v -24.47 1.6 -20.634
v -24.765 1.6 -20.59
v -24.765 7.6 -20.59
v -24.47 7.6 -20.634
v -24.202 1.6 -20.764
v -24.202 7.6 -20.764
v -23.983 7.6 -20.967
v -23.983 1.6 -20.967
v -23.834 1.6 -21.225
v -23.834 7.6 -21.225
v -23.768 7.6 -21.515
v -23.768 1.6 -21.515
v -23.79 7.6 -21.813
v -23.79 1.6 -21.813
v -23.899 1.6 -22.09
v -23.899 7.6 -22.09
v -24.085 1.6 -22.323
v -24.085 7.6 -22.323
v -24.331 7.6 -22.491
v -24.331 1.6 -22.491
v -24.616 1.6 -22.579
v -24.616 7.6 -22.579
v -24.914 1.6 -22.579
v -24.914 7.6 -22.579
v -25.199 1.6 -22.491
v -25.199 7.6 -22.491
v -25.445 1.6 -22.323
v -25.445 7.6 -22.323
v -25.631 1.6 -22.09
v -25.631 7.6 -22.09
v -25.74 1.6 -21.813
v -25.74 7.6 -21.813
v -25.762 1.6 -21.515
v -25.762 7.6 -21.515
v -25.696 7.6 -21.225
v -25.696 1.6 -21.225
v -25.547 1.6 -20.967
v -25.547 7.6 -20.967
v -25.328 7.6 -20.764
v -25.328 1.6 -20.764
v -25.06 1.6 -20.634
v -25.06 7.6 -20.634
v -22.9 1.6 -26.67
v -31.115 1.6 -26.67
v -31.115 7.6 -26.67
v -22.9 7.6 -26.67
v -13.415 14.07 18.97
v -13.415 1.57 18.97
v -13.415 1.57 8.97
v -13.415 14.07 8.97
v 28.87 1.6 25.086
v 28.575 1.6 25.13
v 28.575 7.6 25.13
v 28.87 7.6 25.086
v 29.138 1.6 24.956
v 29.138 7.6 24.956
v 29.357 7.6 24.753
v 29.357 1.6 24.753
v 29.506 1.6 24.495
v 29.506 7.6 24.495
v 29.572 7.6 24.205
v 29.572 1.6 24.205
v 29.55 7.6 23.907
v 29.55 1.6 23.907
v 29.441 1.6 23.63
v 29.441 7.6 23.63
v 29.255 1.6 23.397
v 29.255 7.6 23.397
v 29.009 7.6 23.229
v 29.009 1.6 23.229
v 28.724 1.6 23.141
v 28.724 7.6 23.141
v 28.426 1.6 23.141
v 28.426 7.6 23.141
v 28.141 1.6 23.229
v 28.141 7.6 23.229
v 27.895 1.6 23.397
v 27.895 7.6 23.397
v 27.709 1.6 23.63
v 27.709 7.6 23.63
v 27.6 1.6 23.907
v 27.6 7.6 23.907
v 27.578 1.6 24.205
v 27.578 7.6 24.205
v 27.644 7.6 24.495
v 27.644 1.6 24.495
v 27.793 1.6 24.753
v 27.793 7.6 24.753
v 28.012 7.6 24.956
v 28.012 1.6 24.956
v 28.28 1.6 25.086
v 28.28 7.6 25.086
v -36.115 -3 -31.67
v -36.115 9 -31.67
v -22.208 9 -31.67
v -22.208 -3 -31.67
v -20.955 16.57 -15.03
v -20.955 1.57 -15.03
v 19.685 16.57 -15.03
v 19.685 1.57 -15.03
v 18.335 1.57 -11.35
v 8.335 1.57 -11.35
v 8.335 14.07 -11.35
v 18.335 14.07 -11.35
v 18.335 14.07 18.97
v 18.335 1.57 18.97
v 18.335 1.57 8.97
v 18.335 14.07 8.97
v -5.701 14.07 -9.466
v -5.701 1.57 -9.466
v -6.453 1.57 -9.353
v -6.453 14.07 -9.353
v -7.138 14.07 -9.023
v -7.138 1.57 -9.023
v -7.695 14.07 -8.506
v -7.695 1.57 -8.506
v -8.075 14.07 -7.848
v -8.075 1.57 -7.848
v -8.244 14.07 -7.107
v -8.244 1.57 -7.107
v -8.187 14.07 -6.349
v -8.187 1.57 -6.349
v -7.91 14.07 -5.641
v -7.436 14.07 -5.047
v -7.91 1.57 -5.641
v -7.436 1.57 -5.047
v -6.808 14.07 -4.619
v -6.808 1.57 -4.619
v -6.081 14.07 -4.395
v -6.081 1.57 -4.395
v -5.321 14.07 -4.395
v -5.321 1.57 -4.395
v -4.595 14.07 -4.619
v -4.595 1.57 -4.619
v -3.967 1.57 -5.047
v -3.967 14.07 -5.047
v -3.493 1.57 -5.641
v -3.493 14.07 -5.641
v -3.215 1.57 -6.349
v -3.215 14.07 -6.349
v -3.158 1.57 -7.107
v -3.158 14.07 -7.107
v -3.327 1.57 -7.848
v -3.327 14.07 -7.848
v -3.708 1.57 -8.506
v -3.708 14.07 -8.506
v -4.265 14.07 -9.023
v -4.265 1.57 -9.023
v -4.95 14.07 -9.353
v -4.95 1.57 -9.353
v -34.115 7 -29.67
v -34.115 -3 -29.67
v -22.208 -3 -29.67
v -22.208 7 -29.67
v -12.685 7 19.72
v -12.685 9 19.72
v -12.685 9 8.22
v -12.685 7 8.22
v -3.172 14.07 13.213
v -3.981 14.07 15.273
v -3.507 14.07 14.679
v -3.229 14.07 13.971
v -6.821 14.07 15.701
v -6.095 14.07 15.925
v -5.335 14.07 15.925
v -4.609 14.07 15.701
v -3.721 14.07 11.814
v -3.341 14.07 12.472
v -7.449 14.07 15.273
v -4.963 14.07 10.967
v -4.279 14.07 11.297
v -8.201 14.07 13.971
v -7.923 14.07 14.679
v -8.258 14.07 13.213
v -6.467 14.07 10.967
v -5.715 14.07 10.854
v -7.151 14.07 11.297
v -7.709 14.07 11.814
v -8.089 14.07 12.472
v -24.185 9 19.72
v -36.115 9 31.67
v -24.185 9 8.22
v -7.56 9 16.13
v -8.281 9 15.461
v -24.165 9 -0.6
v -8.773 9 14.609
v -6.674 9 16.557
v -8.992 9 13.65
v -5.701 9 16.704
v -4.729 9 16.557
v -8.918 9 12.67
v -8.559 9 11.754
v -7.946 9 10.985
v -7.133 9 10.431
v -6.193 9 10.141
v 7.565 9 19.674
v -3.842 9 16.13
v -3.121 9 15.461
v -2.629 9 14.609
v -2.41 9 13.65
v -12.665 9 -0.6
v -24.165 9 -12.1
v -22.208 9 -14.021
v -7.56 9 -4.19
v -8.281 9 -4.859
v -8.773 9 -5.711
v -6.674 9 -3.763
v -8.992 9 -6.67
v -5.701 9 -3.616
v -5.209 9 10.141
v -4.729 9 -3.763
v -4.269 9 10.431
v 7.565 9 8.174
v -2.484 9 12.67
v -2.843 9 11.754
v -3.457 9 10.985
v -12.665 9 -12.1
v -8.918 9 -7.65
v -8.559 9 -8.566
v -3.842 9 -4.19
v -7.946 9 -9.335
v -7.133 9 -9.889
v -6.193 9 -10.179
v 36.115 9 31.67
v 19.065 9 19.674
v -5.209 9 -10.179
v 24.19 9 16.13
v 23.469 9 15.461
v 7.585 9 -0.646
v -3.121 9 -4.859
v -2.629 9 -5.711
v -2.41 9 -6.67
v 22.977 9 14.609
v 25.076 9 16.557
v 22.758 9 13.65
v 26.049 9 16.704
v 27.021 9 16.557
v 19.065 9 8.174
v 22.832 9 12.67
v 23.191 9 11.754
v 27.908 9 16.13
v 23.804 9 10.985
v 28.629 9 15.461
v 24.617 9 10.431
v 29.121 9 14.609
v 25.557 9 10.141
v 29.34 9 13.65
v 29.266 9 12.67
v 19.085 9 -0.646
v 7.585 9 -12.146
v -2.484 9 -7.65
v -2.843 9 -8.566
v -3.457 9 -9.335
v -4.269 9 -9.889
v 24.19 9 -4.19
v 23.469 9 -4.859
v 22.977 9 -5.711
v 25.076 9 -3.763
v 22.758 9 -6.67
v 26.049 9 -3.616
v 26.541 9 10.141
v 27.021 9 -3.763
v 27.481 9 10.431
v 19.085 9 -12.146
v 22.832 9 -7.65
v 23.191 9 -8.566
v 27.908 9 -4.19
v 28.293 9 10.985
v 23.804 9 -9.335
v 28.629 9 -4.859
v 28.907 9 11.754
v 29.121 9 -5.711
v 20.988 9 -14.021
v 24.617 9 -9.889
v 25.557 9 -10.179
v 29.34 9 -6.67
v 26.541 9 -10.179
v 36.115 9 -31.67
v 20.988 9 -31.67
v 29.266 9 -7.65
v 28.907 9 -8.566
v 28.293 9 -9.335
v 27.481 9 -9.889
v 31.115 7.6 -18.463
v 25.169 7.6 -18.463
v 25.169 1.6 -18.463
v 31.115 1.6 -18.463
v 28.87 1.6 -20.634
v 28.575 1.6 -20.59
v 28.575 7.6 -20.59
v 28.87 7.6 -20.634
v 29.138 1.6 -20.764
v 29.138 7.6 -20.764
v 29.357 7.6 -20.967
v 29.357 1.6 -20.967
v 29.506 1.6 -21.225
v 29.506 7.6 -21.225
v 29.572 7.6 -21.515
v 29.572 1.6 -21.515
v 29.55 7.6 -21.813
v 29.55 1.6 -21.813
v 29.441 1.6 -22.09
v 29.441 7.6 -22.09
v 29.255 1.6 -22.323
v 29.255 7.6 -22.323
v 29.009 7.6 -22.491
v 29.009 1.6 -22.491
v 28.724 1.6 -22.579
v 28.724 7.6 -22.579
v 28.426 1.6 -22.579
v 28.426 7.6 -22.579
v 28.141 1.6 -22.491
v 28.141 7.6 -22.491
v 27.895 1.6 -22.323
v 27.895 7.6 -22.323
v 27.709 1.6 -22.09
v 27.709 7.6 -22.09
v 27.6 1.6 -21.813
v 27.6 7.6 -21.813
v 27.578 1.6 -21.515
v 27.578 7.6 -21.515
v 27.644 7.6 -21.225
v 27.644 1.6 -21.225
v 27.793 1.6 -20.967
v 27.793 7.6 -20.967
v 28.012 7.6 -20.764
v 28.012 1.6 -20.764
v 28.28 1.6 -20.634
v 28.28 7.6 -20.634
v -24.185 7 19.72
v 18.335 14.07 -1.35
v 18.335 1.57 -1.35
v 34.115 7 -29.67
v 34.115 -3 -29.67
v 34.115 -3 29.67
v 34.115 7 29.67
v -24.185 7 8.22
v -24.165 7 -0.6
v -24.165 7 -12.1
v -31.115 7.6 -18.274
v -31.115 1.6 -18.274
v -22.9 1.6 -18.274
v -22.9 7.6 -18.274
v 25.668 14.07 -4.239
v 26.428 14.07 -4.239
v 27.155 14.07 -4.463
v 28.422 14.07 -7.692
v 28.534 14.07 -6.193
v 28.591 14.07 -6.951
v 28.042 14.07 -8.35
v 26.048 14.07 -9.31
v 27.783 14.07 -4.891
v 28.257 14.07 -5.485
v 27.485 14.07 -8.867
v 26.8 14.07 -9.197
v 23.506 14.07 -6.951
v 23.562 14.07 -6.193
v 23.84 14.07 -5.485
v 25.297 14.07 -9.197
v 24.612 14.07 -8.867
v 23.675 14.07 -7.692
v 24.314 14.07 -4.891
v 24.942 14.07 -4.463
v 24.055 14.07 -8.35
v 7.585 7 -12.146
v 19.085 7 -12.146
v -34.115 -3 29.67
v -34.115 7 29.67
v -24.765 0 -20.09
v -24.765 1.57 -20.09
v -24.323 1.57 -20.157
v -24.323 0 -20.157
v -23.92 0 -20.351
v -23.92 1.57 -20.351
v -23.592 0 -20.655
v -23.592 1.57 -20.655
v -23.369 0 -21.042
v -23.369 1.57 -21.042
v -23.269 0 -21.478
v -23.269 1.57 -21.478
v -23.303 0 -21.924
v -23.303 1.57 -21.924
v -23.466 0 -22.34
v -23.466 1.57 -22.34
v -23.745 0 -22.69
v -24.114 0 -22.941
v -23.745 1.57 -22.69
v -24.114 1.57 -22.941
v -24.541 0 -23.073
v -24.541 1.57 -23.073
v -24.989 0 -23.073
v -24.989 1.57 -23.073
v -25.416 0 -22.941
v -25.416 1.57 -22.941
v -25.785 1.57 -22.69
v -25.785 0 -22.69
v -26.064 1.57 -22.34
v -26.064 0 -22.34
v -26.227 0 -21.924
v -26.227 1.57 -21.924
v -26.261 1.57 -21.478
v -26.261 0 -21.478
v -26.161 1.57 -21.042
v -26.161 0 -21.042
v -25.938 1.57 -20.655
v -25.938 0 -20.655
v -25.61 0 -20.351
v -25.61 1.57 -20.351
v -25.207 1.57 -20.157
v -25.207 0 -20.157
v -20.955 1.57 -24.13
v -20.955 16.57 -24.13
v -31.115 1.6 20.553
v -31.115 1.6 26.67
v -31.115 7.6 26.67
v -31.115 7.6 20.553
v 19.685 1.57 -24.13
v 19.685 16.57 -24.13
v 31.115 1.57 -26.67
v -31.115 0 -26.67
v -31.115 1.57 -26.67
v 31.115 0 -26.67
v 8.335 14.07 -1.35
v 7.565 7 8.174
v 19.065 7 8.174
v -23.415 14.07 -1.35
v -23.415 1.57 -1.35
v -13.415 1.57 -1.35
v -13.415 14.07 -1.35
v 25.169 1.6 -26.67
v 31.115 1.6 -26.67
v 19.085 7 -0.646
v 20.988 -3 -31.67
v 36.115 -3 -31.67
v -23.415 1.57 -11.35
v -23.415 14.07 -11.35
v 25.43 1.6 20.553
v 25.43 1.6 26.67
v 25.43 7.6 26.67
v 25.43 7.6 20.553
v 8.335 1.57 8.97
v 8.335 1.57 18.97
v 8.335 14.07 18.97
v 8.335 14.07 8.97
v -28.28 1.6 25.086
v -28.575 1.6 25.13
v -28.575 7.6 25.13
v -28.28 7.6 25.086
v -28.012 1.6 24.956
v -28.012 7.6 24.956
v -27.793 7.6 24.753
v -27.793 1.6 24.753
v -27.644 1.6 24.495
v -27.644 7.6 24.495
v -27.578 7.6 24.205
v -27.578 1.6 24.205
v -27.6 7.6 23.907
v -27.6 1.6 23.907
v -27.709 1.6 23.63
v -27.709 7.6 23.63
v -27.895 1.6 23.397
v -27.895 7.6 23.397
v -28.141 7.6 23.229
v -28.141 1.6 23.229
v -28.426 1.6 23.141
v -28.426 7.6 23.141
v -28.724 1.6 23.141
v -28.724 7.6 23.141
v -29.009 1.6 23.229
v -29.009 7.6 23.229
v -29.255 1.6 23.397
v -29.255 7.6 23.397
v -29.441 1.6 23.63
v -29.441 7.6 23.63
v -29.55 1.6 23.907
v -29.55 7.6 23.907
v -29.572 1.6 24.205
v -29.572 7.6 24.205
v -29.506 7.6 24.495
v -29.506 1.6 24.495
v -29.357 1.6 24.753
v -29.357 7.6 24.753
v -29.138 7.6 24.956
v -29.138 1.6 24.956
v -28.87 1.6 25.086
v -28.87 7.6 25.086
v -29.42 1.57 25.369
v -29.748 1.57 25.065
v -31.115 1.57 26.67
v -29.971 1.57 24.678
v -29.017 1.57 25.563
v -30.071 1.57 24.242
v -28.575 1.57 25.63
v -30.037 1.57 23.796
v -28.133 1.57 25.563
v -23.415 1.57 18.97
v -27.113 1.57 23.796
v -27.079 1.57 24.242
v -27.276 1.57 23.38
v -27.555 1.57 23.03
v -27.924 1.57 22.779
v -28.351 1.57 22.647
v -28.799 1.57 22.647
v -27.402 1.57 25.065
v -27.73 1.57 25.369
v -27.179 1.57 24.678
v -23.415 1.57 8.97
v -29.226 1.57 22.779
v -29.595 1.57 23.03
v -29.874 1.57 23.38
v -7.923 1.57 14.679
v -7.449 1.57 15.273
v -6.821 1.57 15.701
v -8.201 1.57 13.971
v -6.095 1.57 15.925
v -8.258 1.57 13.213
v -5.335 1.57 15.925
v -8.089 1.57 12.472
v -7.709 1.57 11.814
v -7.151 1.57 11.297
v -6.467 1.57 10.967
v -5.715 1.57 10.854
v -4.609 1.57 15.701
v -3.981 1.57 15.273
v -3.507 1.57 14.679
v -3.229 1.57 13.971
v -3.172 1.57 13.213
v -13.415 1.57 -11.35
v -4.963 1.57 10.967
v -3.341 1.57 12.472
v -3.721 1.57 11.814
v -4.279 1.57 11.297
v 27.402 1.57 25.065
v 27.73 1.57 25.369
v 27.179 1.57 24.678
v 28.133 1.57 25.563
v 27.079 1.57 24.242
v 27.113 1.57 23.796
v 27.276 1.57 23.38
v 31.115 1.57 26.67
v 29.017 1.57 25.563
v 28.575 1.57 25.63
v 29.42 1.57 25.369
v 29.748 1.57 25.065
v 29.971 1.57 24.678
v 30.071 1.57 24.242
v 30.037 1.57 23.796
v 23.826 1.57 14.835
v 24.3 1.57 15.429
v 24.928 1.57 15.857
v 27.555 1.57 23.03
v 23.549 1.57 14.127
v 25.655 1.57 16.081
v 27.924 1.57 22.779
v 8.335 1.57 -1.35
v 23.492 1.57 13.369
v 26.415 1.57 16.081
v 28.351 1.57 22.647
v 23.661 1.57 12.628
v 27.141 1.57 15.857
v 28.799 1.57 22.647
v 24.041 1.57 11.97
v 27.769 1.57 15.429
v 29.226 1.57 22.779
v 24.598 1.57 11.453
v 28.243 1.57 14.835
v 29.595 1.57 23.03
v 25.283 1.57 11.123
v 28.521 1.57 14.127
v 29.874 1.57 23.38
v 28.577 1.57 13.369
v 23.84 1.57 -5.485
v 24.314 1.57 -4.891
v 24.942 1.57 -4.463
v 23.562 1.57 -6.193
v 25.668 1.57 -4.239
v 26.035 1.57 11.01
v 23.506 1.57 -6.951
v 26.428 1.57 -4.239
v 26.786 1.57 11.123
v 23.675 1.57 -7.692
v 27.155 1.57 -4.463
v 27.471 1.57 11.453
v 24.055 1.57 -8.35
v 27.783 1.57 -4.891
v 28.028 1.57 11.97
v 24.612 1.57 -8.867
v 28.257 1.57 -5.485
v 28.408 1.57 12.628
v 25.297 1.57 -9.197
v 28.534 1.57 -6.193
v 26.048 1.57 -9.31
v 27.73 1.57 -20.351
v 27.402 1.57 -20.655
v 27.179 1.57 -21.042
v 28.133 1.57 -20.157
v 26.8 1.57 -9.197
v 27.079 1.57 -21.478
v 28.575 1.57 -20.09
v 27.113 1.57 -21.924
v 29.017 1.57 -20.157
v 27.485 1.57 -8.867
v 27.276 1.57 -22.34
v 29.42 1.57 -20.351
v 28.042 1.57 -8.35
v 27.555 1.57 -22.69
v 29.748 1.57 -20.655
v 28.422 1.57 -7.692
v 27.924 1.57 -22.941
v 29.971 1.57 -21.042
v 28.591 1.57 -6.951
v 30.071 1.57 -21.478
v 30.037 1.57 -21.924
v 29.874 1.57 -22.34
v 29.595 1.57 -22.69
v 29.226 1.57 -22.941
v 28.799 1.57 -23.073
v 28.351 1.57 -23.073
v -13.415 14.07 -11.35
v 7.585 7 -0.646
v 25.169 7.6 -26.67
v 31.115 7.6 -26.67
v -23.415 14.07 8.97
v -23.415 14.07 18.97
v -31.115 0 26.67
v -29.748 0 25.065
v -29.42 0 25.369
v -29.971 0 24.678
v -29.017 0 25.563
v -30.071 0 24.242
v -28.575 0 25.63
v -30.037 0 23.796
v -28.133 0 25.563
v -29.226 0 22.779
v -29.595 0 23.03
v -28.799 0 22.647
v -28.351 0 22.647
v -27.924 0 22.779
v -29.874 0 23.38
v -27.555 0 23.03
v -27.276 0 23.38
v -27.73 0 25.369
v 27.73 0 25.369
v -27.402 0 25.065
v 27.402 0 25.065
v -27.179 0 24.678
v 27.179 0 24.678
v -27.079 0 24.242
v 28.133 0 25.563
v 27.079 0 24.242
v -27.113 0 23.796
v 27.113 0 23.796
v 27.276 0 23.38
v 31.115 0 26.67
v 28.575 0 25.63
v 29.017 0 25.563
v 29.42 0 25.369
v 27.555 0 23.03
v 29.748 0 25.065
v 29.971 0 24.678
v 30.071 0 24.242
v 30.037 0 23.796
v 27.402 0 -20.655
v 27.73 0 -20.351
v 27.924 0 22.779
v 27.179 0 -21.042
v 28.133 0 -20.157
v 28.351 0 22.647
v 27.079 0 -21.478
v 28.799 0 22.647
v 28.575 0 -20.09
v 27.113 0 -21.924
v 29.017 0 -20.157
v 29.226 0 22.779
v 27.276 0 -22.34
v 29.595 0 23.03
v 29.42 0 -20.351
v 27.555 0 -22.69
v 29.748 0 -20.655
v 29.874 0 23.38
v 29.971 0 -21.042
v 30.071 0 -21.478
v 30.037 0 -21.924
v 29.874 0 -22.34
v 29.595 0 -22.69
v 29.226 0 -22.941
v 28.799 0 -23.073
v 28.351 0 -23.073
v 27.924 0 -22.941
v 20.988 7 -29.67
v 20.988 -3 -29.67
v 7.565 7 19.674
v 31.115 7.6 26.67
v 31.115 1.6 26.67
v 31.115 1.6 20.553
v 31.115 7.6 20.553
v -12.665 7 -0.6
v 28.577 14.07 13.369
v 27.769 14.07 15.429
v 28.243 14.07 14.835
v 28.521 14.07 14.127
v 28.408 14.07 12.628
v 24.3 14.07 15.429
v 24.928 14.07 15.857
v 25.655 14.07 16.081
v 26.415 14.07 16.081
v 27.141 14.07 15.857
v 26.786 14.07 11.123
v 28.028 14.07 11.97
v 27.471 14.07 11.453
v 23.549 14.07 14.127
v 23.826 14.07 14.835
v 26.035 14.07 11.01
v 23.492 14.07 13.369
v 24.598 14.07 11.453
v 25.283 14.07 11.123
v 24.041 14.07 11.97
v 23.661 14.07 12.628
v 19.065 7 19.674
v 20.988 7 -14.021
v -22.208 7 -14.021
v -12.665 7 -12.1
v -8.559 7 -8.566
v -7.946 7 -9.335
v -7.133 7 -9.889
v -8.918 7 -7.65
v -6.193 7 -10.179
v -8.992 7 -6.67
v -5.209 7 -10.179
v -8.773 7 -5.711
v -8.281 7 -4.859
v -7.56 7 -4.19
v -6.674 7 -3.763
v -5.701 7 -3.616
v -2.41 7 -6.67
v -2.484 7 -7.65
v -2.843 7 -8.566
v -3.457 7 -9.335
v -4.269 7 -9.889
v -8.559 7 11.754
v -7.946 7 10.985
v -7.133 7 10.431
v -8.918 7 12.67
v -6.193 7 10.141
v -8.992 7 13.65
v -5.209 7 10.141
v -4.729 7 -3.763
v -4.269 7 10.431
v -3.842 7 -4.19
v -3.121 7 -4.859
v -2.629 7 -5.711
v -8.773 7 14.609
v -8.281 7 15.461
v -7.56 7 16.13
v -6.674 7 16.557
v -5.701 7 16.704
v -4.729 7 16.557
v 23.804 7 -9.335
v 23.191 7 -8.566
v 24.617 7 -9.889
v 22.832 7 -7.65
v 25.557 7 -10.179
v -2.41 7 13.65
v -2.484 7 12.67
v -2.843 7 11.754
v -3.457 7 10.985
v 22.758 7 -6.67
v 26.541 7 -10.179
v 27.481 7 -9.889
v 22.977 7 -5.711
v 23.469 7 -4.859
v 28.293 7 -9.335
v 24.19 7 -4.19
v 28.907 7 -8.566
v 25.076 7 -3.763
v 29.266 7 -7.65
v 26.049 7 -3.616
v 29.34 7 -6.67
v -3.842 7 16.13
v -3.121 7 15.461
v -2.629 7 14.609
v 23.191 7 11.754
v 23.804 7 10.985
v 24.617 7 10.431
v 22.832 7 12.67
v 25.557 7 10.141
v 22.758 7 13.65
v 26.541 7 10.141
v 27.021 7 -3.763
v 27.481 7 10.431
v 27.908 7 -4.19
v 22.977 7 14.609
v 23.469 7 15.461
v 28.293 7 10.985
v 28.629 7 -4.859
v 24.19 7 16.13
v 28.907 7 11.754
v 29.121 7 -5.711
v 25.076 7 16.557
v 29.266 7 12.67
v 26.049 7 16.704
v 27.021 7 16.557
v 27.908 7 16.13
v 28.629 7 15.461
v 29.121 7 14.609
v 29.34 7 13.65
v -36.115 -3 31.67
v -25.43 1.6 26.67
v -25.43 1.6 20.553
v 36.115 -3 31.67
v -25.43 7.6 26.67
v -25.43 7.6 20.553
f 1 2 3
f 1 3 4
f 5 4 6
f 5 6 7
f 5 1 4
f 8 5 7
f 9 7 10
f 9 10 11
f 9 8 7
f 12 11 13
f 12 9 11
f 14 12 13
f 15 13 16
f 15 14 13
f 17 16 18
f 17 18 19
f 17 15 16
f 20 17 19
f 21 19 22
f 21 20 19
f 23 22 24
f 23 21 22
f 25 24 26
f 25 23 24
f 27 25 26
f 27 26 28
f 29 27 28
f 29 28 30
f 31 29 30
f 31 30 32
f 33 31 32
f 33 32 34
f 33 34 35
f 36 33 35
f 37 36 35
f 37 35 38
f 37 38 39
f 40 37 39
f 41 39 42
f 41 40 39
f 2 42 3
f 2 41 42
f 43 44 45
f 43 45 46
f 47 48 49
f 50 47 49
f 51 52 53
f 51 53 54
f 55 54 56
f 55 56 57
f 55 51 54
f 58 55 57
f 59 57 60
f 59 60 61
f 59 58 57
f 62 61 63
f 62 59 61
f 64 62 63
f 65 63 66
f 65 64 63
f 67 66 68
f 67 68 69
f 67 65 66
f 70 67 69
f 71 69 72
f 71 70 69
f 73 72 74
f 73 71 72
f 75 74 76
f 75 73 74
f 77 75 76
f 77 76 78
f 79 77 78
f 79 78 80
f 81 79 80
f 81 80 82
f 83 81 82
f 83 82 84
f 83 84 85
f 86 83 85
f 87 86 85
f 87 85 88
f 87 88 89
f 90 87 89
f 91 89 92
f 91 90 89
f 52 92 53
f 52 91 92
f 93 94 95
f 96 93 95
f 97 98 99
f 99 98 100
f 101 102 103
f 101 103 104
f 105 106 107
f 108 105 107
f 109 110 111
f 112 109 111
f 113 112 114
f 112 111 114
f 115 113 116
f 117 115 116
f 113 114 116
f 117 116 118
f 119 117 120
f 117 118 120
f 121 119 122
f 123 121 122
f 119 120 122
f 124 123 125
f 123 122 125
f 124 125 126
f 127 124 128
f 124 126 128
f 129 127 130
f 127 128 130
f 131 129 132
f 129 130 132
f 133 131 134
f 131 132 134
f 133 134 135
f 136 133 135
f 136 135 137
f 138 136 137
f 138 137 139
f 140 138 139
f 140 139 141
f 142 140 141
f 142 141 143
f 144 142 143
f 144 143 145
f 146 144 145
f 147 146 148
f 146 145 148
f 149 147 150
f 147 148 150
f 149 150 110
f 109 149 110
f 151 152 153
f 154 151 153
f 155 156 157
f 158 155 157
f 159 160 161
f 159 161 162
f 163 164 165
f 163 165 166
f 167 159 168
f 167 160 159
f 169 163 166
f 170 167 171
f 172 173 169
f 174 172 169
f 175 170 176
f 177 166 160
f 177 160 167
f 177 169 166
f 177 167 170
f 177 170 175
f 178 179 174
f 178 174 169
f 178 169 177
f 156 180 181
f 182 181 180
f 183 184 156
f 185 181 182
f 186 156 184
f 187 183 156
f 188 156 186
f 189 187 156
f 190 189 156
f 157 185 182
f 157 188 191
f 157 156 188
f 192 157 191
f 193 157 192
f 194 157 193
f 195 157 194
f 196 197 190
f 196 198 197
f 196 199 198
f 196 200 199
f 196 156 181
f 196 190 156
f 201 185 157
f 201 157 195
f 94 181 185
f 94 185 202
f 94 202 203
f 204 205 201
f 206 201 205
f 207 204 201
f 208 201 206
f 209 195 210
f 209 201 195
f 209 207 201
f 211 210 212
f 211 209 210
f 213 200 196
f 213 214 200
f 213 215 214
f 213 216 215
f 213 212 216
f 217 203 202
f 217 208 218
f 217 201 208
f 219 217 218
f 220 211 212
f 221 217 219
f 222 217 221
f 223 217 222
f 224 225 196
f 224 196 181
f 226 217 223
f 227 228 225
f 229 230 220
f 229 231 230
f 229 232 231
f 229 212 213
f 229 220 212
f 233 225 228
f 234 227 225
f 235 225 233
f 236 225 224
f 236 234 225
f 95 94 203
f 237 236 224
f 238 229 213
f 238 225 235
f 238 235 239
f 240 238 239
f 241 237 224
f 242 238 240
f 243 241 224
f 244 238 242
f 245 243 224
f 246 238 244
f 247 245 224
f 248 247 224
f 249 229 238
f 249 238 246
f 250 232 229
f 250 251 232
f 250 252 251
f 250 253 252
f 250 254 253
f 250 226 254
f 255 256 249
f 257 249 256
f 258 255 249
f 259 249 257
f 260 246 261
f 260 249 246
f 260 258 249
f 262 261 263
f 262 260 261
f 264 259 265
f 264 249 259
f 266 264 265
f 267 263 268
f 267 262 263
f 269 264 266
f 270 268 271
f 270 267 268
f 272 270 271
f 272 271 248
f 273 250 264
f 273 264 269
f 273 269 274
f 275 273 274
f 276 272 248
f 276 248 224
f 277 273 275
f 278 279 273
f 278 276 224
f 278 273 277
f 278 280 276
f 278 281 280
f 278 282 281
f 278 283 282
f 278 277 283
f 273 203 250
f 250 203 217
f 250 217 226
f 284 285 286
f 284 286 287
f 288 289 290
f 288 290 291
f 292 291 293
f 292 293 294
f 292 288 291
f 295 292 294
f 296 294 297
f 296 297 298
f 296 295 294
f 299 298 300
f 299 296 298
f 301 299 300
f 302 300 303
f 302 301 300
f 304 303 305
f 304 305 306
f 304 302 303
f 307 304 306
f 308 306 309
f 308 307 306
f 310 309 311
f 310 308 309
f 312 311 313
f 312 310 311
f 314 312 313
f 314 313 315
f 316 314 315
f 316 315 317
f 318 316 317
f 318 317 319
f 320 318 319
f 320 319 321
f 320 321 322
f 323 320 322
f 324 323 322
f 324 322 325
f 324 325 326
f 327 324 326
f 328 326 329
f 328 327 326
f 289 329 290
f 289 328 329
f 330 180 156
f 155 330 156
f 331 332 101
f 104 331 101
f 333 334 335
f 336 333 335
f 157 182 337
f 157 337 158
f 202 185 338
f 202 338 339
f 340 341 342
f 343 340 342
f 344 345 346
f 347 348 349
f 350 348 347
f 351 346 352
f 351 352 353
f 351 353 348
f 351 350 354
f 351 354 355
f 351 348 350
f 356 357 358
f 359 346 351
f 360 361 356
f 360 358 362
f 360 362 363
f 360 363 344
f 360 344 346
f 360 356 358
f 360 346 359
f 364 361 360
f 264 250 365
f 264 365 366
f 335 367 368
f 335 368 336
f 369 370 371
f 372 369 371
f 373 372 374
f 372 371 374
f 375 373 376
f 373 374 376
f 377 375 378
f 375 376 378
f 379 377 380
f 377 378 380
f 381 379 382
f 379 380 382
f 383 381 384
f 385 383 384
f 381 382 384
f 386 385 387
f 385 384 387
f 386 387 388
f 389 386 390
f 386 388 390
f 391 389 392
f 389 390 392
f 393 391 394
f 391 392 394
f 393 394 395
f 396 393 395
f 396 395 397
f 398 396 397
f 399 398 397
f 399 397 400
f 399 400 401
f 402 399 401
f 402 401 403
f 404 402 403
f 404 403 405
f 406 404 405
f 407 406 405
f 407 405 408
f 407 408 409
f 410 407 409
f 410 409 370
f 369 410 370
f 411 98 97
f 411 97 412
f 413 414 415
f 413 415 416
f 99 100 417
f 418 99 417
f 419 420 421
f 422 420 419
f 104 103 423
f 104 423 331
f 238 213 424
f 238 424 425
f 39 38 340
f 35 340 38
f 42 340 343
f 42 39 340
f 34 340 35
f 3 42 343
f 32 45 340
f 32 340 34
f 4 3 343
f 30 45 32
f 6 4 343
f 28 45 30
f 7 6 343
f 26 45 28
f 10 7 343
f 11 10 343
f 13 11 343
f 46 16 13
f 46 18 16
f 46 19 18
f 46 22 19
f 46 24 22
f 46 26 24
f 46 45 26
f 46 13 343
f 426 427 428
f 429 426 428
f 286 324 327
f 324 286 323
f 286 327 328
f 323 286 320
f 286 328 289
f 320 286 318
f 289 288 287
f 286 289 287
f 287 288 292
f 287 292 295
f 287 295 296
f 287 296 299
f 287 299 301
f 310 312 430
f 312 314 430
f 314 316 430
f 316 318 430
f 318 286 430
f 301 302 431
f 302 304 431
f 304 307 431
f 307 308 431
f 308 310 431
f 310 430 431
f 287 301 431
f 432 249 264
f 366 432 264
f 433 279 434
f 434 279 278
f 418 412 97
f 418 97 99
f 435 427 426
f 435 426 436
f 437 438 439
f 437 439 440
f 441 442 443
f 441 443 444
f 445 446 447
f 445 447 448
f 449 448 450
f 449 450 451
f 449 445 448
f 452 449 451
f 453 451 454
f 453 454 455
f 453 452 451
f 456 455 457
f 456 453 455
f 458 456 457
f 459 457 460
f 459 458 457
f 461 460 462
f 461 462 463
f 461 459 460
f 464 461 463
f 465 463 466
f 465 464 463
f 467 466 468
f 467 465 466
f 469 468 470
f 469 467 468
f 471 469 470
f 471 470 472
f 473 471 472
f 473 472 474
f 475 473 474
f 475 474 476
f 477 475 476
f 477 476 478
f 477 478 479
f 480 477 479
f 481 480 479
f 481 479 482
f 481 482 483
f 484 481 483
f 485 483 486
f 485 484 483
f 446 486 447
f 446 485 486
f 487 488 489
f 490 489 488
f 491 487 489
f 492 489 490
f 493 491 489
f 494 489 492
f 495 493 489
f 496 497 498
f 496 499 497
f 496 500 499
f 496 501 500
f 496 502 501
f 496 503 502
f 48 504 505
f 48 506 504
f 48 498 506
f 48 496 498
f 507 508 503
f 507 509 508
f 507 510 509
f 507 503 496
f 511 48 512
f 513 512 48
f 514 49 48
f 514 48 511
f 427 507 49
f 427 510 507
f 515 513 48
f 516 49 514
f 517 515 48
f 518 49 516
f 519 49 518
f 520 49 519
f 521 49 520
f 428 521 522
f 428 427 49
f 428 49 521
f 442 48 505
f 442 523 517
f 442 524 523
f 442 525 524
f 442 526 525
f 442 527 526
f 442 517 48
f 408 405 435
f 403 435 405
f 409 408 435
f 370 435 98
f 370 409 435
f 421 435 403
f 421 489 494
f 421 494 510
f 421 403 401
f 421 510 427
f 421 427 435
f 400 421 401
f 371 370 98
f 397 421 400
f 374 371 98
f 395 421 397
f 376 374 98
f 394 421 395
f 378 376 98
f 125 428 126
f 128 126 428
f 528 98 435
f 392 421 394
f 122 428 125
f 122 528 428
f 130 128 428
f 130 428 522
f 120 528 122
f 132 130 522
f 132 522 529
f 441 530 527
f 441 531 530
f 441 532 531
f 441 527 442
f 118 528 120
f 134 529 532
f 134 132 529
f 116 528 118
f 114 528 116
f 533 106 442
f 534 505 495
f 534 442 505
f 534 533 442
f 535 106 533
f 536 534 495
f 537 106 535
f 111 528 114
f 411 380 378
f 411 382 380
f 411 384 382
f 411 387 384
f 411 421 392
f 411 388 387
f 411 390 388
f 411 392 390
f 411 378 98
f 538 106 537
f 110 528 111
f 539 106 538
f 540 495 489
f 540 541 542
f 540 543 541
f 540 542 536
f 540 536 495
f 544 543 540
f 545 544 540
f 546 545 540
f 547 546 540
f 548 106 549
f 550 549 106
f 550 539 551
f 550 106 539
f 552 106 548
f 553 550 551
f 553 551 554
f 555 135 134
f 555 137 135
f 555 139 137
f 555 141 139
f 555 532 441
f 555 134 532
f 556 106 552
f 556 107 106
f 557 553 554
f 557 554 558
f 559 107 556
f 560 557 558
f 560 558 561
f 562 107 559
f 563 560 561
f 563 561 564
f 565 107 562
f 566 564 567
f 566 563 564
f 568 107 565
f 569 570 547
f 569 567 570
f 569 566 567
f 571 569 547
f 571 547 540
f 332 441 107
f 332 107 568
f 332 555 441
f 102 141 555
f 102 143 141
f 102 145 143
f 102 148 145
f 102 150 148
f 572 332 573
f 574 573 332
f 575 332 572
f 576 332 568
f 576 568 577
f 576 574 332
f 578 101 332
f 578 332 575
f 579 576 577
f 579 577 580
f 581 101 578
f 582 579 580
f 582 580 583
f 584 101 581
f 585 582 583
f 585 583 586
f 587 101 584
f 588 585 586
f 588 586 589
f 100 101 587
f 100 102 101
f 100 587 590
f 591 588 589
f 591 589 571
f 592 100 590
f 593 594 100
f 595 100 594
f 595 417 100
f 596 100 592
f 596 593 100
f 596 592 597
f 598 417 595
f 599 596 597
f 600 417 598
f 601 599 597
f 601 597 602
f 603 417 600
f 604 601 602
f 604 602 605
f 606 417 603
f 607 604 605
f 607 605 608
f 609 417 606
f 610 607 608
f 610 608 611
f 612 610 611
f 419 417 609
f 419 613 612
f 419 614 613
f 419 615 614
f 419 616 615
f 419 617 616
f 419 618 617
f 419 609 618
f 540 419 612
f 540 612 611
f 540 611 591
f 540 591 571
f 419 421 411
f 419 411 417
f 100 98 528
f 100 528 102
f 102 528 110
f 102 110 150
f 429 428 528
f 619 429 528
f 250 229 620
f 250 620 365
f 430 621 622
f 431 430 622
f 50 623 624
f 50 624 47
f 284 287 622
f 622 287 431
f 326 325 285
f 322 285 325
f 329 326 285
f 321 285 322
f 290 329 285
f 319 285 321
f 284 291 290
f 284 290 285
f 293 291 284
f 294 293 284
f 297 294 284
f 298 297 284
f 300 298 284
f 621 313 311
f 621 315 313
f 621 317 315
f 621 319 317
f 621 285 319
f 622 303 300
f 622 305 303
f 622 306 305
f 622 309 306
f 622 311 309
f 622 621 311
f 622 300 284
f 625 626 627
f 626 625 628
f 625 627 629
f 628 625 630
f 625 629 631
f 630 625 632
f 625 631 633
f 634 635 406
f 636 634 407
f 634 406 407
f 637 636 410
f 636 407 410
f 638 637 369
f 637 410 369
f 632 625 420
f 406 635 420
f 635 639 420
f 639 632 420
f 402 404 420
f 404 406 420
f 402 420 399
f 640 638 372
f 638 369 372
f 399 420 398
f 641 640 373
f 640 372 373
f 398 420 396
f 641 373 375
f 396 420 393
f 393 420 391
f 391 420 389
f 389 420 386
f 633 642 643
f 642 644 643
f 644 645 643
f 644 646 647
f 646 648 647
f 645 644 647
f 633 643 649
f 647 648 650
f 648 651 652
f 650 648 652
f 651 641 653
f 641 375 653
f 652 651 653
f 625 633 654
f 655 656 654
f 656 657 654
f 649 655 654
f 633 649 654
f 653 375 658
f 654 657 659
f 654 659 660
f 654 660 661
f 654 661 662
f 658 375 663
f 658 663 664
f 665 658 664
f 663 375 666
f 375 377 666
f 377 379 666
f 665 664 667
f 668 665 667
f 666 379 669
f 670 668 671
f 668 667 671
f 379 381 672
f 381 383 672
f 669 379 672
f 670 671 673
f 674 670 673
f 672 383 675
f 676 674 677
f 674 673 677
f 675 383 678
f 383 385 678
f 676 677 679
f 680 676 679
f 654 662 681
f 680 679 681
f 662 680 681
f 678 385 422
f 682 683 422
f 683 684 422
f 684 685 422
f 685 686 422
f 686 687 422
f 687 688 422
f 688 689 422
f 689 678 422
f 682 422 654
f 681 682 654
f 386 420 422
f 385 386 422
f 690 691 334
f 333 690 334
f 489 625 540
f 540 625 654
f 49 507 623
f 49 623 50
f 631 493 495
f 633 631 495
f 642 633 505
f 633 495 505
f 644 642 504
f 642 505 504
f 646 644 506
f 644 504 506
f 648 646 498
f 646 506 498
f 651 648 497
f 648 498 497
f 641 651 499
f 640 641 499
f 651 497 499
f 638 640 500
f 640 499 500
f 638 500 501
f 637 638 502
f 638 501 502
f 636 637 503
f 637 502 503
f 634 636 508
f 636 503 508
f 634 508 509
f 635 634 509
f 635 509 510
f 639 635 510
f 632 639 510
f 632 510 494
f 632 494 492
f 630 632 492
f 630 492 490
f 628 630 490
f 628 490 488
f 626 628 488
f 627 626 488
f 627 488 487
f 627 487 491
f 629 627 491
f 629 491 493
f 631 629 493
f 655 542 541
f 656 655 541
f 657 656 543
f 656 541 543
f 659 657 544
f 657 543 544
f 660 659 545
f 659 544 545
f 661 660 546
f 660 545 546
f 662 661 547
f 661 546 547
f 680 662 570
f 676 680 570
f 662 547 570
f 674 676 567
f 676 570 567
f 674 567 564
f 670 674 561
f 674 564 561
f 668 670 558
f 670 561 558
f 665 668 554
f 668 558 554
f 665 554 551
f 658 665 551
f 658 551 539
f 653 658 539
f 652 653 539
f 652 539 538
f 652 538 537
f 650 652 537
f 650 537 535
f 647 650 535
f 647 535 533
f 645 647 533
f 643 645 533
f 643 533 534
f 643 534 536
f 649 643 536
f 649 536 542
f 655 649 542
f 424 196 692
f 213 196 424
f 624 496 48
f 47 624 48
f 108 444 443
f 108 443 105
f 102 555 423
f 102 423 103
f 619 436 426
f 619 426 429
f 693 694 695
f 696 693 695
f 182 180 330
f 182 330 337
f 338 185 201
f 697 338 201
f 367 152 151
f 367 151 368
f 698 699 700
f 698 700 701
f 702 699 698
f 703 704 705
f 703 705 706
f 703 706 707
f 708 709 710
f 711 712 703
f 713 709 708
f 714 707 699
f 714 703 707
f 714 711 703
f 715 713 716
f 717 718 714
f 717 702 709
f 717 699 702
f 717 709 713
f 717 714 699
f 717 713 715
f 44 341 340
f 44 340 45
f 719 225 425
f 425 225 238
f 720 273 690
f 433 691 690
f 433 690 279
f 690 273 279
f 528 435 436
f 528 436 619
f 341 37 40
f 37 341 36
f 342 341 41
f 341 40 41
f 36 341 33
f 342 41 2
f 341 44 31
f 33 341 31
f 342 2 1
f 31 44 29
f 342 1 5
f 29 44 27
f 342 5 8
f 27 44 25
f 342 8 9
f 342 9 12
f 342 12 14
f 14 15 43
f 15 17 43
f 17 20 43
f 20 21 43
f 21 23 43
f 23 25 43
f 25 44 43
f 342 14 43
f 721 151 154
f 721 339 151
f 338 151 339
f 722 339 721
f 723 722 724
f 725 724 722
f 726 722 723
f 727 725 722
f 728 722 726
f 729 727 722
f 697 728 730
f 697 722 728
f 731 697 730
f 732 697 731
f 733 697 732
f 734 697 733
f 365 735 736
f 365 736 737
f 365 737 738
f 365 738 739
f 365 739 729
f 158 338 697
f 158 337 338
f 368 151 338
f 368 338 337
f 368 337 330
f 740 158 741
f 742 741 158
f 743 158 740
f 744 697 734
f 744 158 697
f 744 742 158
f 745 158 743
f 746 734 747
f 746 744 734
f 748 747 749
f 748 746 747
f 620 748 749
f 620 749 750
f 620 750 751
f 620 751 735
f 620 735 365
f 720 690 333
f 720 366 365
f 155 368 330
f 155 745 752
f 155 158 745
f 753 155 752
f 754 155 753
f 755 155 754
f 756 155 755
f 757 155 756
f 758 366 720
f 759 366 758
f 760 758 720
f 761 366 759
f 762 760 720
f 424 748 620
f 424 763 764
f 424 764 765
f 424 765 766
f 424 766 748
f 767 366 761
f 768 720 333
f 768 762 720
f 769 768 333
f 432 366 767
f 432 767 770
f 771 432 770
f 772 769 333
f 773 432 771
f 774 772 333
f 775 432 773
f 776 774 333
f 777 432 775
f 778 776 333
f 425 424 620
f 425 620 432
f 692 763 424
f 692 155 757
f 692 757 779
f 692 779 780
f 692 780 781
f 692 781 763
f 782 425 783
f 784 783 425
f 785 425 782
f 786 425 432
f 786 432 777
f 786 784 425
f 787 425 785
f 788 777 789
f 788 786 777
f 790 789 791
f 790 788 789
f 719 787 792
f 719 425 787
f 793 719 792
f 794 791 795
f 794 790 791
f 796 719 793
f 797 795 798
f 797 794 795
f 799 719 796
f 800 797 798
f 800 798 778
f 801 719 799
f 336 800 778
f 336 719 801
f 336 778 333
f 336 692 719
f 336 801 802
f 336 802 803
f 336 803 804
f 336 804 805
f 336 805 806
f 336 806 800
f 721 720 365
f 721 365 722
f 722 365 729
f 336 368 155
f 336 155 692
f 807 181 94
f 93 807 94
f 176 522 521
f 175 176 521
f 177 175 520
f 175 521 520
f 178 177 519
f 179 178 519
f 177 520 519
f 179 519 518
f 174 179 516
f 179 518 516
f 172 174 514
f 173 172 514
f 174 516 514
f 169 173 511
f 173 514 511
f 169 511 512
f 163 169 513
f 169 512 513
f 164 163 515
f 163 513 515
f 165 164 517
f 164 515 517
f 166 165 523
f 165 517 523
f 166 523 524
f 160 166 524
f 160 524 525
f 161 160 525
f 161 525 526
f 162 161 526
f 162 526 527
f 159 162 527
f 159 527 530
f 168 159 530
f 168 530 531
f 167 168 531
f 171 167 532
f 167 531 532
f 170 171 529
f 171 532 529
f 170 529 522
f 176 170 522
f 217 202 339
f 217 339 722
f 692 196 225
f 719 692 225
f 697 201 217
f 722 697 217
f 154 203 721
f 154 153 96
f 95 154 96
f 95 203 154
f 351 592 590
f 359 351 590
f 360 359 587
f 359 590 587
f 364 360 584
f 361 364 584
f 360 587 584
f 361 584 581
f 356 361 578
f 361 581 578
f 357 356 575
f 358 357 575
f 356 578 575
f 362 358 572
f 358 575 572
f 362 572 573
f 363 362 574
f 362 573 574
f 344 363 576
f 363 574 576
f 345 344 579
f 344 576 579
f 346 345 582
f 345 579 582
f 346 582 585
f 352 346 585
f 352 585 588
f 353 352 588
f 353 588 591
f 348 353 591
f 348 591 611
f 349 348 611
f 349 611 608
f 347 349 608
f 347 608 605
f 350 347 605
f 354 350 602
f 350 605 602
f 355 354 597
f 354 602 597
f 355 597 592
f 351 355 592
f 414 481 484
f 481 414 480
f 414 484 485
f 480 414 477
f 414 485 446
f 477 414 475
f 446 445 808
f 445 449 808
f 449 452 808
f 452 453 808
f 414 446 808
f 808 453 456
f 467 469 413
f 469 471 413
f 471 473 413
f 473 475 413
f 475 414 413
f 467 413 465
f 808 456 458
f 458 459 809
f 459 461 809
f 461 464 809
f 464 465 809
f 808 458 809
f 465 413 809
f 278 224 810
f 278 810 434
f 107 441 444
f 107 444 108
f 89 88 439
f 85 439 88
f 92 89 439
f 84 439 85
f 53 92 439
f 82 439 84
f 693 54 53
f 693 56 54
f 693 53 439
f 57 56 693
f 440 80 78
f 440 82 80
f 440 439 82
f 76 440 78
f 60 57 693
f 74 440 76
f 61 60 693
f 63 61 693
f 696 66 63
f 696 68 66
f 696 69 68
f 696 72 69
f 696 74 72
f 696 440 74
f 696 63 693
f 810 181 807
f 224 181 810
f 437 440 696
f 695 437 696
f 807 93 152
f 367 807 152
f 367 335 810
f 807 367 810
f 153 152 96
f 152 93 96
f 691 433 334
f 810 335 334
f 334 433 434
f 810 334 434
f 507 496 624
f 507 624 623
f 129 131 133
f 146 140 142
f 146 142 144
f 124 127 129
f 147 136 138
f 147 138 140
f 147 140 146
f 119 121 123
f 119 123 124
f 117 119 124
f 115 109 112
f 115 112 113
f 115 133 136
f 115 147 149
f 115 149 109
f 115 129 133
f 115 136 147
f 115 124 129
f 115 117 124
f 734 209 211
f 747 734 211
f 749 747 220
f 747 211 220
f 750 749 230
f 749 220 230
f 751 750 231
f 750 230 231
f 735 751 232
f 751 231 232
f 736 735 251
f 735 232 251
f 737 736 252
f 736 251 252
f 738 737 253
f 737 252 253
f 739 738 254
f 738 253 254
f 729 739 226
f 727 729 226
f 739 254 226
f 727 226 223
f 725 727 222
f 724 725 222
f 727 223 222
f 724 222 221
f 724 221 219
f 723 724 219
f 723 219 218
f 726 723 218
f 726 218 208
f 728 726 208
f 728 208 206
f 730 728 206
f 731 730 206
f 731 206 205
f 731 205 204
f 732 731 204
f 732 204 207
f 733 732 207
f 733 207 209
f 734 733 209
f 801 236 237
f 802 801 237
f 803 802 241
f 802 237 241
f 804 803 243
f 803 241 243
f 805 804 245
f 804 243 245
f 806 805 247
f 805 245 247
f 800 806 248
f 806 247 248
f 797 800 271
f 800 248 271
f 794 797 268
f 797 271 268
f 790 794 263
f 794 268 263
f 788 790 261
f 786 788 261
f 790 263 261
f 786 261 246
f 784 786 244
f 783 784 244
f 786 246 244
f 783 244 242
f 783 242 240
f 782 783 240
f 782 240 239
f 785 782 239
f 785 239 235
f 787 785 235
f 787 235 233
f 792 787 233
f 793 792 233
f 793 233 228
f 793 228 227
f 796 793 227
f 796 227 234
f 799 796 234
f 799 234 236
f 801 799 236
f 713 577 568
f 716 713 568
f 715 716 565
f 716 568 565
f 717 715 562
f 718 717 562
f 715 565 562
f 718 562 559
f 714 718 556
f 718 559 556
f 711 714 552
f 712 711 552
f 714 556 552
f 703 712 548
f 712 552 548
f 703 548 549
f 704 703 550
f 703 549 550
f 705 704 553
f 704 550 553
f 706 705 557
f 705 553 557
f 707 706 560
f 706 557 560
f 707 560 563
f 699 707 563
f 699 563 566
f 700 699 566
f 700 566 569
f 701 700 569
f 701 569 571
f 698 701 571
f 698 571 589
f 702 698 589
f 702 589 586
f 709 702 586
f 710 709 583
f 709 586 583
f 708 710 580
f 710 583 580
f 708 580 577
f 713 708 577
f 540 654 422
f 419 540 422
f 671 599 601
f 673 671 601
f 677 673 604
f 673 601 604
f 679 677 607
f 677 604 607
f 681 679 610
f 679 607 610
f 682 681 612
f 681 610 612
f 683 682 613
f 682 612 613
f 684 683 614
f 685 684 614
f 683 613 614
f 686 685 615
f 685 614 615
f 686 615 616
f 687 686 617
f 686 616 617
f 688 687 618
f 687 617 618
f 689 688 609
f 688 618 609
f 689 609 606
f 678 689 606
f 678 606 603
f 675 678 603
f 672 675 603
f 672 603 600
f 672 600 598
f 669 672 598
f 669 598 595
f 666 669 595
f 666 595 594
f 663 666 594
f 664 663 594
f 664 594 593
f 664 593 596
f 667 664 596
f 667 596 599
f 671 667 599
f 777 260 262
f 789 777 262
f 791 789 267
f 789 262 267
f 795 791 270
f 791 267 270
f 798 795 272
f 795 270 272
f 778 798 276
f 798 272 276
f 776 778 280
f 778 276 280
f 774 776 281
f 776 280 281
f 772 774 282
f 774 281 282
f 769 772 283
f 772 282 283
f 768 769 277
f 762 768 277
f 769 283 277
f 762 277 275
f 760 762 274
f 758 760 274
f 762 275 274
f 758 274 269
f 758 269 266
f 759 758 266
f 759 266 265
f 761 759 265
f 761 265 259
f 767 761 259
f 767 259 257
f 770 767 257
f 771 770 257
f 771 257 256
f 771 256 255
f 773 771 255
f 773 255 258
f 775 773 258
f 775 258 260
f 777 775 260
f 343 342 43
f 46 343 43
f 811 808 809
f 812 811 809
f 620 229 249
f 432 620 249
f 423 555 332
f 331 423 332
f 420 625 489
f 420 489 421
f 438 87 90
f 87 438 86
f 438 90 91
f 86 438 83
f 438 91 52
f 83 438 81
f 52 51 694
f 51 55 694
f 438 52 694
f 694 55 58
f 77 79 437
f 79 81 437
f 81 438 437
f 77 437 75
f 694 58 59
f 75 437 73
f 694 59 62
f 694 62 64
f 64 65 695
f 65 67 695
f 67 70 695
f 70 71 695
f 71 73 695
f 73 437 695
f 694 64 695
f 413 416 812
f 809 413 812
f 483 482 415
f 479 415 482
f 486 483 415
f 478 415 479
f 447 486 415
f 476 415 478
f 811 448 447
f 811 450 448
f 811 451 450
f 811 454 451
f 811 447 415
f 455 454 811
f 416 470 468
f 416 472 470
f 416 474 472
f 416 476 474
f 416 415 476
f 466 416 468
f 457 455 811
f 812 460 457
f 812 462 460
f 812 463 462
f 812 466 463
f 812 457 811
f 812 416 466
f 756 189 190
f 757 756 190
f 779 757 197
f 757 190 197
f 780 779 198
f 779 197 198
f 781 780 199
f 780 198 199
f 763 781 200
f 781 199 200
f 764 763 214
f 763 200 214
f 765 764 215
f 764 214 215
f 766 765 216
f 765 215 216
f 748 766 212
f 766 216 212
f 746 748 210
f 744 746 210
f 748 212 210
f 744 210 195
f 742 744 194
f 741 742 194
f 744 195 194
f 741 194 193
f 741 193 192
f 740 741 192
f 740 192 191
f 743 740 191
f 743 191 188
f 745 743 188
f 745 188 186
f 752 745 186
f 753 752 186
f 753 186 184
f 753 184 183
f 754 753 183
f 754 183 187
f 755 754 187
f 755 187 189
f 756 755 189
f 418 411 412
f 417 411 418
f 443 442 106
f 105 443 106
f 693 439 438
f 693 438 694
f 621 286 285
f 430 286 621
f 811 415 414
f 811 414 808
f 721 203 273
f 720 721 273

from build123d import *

# Parameters (mm, degrees)
SKETCH1_W             = 62.23
SKETCH1_H             = 53.34
BOSS_EXTRUDE1_DEPTH   = 1.57
SKETCH2_W             = 10
SKETCH2_H             = 10
BOSS_EXTRUDE2_DEPTH   = 12.5
SKETCH3_R             = 2.55
BOSS_EXTRUDE3_DEPTH   = 12.5
SKETCH4_W             = 40.64
SKETCH4_H             = 9.1
BOSS_EXTRUDE4_DEPTH   = 15
SKETCH5_R             = 1.5
CUT_EXTRUDE1_DEPTH    = 44.639799782
SKETCH6_W             = 72.23
SKETCH6_H             = 63.34
BOSS_EXTRUDE5_DEPTH   = 12
SKETCH7_W             = 68.23
SKETCH7_H             = 59.34
CUT_EXTRUDE2_DEPTH    = 10
SKETCH8_R             = 3.3
SKETCH8_W             = 43.19595156
SKETCH8_H             = 17.648733465
SKETCH8_W_2           = 11.5
SKETCH8_H_2           = 11.5
CUT_EXTRUDE3_DEPTH    = 50.510424407
SKETCH9_W             = 8.2149345
SKETCH9_H             = 8.395539661
SKETCH9_R             = 1
BOSS_EXTRUDE6_DEPTH   = 6
SKETCH9_W_2           = 5.685125291
SKETCH9_H_2           = 6.117087564
BOSS_EXTRUDE6_2_DEPTH = 6
BOSS_EXTRUDE6_3_DEPTH = 6
SKETCH9_W_3           = 5.946391127
SKETCH9_H_3           = 8.207214253
BOSS_EXTRUDE6_4_DEPTH = 6


with BuildPart() as part:
    # Sketch1 → Boss-Extrude1 (new body)
    with BuildSketch(Plane(origin=(0, 0, 0), x_dir=(1, 0, 0), z_dir=(0, 1, 0))):
        Rectangle(SKETCH1_W, SKETCH1_H)
    extrude(amount=BOSS_EXTRUDE1_DEPTH)

    # Sketch2 → Boss-Extrude2 (add)
    with BuildSketch(Plane(origin=(0, 1.57, 0), x_dir=(1, 0, 0), z_dir=(0, 1, 0))):
        with Locations((-18.415, -13.97)):
            Rectangle(SKETCH2_W, SKETCH2_H)
        with Locations((13.335, -13.97)):
            Rectangle(SKETCH2_W, SKETCH2_H)
        with Locations((13.335, 6.35)):
            Rectangle(SKETCH2_W, SKETCH2_H)
        with Locations((-18.415, 6.35)):
            Rectangle(SKETCH2_W, SKETCH2_H)
    extrude(amount=BOSS_EXTRUDE2_DEPTH)

    # Sketch3 → Boss-Extrude3 (add)
    with BuildSketch(Plane(origin=(0, 1.57, 0), x_dir=(1, 0, 0), z_dir=(0, 1, 0))):
        with Locations(Location((-5.715, -13.403860223, 0), (0, 0, 90))):
            Circle(SKETCH3_R)
        with Locations(Location((26.034616992, -13.559811685, 0), (0, 0, 90))):
            Circle(SKETCH3_R)
        with Locations(Location((26.04840041, 6.760188315, 0), (0, 0, 90))):
            Circle(SKETCH3_R)
        with Locations(Location((-5.701216582, 6.916139777, 0), (0, 0, 90))):
            Circle(SKETCH3_R)
    extrude(amount=BOSS_EXTRUDE3_DEPTH)

    # Sketch4 → Boss-Extrude4 (add)
    with BuildSketch(Plane(origin=(0, 1.57, 0), x_dir=(1, 0, 0), z_dir=(0, 1, 0))):
        with Locations((-0.635, 19.58)):
            Rectangle(SKETCH4_W, SKETCH4_H)
    extrude(amount=BOSS_EXTRUDE4_DEPTH)

    # Sketch5 → Cut-Extrude1 (cut, through all)
    with BuildSketch(Plane(origin=(0, 1.57, 0), x_dir=(1, 0, 0), z_dir=(0, 1, 0))):
        with Locations(Location((-24.765, 21.59, 0), (0, 0, 270))):
            Circle(SKETCH5_R)
        with Locations(Location((-28.575, -24.13, 0), (0, 0, 270))):
            Circle(SKETCH5_R)
        with Locations(Location((28.575, -24.13, 0), (0, 0, 270))):
            Circle(SKETCH5_R)
        with Locations(Location((28.575, 21.59, 0), (0, 0, 270))):
            Circle(SKETCH5_R)
    extrude(amount=-CUT_EXTRUDE1_DEPTH, mode=Mode.SUBTRACT)


with BuildPart() as body_2:
    # Sketch6 → Boss-Extrude5 (new body)
    with BuildSketch(Plane(origin=(0, 9, 0), x_dir=(1, 0, 0), z_dir=(0, 1, 0))):
        Rectangle(SKETCH6_W, SKETCH6_H)
    extrude(amount=-BOSS_EXTRUDE5_DEPTH)

    # Sketch7 → Cut-Extrude2 (cut)
    with BuildSketch(Plane.XZ.offset(3)):
        Rectangle(SKETCH7_W, SKETCH7_H)
    extrude(amount=-CUT_EXTRUDE2_DEPTH, mode=Mode.SUBTRACT)

    # Sketch8 → Cut-Extrude3 (cut, through all)
    with BuildSketch(Plane(origin=(0, 9, 0), x_dir=(1, 0, 0), z_dir=(0, 1, 0))):
        with Locations(Location((26.048783418, 6.916139777, 0), (0, 0, 270))):
            Circle(SKETCH8_R)
        with Locations(Location((26.048783418, -13.403860223, 0), (0, 0, 270))):
            Circle(SKETCH8_R)
        with Locations(Location((-5.701216582, 6.916139777, 0), (0, 0, 270))):
            Circle(SKETCH8_R)
        with Locations(Location((-5.701216582, -13.403860223, 0), (0, 0, 270))):
            Circle(SKETCH8_R)
        with Locations((-0.609620284, 22.845633268)):
            Rectangle(SKETCH8_W, SKETCH8_H)
        with Locations((13.334966367, 6.396213524)):
            Rectangle(SKETCH8_W_2, SKETCH8_H_2)
        with Locations((-18.415, 6.35)):
            Rectangle(SKETCH8_W_2, SKETCH8_H_2)
        with Locations((13.314875799, -13.923776544)):
            Rectangle(SKETCH8_W_2, SKETCH8_H_2)
        with Locations((-18.435090568, -13.969990068)):
            Rectangle(SKETCH8_W_2, SKETCH8_H_2)
    extrude(amount=-CUT_EXTRUDE3_DEPTH, mode=Mode.SUBTRACT)


with BuildPart() as body_3:
    # Sketch9 → Boss-Extrude6 (new body)
    with BuildSketch(Plane(origin=(0, 1.6, 0), x_dir=(1, 0, 0), z_dir=(0, 1, 0))):
        with Locations((-27.00753275, 22.47223017)):
            Rectangle(SKETCH9_W, SKETCH9_H)
        with Locations(Location((-24.765, 21.59, 0), (0, 0, 270))):
            Circle(SKETCH9_R, mode=Mode.SUBTRACT)
    extrude(amount=BOSS_EXTRUDE6_DEPTH)


with BuildPart() as body_4:
    # Sketch9 → Boss-Extrude6 2 (new body)
    with BuildSketch(Plane(origin=(0, 1.6, 0), x_dir=(1, 0, 0), z_dir=(0, 1, 0))):
        with Locations((-28.272437354, -23.611456218)):
            Rectangle(SKETCH9_W_2, SKETCH9_H_2)
        with Locations(Location((-28.575, -24.13, 0), (0, 0, 270))):
            Circle(SKETCH9_R, mode=Mode.SUBTRACT)
    extrude(amount=BOSS_EXTRUDE6_2_DEPTH)


with BuildPart() as body_5:
    # Sketch9 → Boss-Extrude6 3 (new body)
    with BuildSketch(Plane(origin=(0, 1.6, 0), x_dir=(1, 0, 0), z_dir=(0, 1, 0))):
        with Locations((28.272437354, -23.611456218)):
            Rectangle(SKETCH9_W_2, SKETCH9_H_2)
        with Locations(Location((28.575, -24.13, 0), (0, 0, 270))):
            Circle(SKETCH9_R, mode=Mode.SUBTRACT)
    extrude(amount=BOSS_EXTRUDE6_3_DEPTH)


with BuildPart() as body_6:
    # Sketch9 → Boss-Extrude6 4 (new body)
    with BuildSketch(Plane(origin=(0, 1.6, 0), x_dir=(1, 0, 0), z_dir=(0, 1, 0))):
        with Locations((28.141804437, 22.566392873)):
            Rectangle(SKETCH9_W_3, SKETCH9_H_3)
        with Locations(Location((28.575, 21.59, 0), (0, 0, 270))):
            Circle(SKETCH9_R, mode=Mode.SUBTRACT)
    extrude(amount=BOSS_EXTRUDE6_4_DEPTH)


solid = Compound([part.part, body_2.part, body_3.part, body_4.part, body_5.part, body_6.part])
